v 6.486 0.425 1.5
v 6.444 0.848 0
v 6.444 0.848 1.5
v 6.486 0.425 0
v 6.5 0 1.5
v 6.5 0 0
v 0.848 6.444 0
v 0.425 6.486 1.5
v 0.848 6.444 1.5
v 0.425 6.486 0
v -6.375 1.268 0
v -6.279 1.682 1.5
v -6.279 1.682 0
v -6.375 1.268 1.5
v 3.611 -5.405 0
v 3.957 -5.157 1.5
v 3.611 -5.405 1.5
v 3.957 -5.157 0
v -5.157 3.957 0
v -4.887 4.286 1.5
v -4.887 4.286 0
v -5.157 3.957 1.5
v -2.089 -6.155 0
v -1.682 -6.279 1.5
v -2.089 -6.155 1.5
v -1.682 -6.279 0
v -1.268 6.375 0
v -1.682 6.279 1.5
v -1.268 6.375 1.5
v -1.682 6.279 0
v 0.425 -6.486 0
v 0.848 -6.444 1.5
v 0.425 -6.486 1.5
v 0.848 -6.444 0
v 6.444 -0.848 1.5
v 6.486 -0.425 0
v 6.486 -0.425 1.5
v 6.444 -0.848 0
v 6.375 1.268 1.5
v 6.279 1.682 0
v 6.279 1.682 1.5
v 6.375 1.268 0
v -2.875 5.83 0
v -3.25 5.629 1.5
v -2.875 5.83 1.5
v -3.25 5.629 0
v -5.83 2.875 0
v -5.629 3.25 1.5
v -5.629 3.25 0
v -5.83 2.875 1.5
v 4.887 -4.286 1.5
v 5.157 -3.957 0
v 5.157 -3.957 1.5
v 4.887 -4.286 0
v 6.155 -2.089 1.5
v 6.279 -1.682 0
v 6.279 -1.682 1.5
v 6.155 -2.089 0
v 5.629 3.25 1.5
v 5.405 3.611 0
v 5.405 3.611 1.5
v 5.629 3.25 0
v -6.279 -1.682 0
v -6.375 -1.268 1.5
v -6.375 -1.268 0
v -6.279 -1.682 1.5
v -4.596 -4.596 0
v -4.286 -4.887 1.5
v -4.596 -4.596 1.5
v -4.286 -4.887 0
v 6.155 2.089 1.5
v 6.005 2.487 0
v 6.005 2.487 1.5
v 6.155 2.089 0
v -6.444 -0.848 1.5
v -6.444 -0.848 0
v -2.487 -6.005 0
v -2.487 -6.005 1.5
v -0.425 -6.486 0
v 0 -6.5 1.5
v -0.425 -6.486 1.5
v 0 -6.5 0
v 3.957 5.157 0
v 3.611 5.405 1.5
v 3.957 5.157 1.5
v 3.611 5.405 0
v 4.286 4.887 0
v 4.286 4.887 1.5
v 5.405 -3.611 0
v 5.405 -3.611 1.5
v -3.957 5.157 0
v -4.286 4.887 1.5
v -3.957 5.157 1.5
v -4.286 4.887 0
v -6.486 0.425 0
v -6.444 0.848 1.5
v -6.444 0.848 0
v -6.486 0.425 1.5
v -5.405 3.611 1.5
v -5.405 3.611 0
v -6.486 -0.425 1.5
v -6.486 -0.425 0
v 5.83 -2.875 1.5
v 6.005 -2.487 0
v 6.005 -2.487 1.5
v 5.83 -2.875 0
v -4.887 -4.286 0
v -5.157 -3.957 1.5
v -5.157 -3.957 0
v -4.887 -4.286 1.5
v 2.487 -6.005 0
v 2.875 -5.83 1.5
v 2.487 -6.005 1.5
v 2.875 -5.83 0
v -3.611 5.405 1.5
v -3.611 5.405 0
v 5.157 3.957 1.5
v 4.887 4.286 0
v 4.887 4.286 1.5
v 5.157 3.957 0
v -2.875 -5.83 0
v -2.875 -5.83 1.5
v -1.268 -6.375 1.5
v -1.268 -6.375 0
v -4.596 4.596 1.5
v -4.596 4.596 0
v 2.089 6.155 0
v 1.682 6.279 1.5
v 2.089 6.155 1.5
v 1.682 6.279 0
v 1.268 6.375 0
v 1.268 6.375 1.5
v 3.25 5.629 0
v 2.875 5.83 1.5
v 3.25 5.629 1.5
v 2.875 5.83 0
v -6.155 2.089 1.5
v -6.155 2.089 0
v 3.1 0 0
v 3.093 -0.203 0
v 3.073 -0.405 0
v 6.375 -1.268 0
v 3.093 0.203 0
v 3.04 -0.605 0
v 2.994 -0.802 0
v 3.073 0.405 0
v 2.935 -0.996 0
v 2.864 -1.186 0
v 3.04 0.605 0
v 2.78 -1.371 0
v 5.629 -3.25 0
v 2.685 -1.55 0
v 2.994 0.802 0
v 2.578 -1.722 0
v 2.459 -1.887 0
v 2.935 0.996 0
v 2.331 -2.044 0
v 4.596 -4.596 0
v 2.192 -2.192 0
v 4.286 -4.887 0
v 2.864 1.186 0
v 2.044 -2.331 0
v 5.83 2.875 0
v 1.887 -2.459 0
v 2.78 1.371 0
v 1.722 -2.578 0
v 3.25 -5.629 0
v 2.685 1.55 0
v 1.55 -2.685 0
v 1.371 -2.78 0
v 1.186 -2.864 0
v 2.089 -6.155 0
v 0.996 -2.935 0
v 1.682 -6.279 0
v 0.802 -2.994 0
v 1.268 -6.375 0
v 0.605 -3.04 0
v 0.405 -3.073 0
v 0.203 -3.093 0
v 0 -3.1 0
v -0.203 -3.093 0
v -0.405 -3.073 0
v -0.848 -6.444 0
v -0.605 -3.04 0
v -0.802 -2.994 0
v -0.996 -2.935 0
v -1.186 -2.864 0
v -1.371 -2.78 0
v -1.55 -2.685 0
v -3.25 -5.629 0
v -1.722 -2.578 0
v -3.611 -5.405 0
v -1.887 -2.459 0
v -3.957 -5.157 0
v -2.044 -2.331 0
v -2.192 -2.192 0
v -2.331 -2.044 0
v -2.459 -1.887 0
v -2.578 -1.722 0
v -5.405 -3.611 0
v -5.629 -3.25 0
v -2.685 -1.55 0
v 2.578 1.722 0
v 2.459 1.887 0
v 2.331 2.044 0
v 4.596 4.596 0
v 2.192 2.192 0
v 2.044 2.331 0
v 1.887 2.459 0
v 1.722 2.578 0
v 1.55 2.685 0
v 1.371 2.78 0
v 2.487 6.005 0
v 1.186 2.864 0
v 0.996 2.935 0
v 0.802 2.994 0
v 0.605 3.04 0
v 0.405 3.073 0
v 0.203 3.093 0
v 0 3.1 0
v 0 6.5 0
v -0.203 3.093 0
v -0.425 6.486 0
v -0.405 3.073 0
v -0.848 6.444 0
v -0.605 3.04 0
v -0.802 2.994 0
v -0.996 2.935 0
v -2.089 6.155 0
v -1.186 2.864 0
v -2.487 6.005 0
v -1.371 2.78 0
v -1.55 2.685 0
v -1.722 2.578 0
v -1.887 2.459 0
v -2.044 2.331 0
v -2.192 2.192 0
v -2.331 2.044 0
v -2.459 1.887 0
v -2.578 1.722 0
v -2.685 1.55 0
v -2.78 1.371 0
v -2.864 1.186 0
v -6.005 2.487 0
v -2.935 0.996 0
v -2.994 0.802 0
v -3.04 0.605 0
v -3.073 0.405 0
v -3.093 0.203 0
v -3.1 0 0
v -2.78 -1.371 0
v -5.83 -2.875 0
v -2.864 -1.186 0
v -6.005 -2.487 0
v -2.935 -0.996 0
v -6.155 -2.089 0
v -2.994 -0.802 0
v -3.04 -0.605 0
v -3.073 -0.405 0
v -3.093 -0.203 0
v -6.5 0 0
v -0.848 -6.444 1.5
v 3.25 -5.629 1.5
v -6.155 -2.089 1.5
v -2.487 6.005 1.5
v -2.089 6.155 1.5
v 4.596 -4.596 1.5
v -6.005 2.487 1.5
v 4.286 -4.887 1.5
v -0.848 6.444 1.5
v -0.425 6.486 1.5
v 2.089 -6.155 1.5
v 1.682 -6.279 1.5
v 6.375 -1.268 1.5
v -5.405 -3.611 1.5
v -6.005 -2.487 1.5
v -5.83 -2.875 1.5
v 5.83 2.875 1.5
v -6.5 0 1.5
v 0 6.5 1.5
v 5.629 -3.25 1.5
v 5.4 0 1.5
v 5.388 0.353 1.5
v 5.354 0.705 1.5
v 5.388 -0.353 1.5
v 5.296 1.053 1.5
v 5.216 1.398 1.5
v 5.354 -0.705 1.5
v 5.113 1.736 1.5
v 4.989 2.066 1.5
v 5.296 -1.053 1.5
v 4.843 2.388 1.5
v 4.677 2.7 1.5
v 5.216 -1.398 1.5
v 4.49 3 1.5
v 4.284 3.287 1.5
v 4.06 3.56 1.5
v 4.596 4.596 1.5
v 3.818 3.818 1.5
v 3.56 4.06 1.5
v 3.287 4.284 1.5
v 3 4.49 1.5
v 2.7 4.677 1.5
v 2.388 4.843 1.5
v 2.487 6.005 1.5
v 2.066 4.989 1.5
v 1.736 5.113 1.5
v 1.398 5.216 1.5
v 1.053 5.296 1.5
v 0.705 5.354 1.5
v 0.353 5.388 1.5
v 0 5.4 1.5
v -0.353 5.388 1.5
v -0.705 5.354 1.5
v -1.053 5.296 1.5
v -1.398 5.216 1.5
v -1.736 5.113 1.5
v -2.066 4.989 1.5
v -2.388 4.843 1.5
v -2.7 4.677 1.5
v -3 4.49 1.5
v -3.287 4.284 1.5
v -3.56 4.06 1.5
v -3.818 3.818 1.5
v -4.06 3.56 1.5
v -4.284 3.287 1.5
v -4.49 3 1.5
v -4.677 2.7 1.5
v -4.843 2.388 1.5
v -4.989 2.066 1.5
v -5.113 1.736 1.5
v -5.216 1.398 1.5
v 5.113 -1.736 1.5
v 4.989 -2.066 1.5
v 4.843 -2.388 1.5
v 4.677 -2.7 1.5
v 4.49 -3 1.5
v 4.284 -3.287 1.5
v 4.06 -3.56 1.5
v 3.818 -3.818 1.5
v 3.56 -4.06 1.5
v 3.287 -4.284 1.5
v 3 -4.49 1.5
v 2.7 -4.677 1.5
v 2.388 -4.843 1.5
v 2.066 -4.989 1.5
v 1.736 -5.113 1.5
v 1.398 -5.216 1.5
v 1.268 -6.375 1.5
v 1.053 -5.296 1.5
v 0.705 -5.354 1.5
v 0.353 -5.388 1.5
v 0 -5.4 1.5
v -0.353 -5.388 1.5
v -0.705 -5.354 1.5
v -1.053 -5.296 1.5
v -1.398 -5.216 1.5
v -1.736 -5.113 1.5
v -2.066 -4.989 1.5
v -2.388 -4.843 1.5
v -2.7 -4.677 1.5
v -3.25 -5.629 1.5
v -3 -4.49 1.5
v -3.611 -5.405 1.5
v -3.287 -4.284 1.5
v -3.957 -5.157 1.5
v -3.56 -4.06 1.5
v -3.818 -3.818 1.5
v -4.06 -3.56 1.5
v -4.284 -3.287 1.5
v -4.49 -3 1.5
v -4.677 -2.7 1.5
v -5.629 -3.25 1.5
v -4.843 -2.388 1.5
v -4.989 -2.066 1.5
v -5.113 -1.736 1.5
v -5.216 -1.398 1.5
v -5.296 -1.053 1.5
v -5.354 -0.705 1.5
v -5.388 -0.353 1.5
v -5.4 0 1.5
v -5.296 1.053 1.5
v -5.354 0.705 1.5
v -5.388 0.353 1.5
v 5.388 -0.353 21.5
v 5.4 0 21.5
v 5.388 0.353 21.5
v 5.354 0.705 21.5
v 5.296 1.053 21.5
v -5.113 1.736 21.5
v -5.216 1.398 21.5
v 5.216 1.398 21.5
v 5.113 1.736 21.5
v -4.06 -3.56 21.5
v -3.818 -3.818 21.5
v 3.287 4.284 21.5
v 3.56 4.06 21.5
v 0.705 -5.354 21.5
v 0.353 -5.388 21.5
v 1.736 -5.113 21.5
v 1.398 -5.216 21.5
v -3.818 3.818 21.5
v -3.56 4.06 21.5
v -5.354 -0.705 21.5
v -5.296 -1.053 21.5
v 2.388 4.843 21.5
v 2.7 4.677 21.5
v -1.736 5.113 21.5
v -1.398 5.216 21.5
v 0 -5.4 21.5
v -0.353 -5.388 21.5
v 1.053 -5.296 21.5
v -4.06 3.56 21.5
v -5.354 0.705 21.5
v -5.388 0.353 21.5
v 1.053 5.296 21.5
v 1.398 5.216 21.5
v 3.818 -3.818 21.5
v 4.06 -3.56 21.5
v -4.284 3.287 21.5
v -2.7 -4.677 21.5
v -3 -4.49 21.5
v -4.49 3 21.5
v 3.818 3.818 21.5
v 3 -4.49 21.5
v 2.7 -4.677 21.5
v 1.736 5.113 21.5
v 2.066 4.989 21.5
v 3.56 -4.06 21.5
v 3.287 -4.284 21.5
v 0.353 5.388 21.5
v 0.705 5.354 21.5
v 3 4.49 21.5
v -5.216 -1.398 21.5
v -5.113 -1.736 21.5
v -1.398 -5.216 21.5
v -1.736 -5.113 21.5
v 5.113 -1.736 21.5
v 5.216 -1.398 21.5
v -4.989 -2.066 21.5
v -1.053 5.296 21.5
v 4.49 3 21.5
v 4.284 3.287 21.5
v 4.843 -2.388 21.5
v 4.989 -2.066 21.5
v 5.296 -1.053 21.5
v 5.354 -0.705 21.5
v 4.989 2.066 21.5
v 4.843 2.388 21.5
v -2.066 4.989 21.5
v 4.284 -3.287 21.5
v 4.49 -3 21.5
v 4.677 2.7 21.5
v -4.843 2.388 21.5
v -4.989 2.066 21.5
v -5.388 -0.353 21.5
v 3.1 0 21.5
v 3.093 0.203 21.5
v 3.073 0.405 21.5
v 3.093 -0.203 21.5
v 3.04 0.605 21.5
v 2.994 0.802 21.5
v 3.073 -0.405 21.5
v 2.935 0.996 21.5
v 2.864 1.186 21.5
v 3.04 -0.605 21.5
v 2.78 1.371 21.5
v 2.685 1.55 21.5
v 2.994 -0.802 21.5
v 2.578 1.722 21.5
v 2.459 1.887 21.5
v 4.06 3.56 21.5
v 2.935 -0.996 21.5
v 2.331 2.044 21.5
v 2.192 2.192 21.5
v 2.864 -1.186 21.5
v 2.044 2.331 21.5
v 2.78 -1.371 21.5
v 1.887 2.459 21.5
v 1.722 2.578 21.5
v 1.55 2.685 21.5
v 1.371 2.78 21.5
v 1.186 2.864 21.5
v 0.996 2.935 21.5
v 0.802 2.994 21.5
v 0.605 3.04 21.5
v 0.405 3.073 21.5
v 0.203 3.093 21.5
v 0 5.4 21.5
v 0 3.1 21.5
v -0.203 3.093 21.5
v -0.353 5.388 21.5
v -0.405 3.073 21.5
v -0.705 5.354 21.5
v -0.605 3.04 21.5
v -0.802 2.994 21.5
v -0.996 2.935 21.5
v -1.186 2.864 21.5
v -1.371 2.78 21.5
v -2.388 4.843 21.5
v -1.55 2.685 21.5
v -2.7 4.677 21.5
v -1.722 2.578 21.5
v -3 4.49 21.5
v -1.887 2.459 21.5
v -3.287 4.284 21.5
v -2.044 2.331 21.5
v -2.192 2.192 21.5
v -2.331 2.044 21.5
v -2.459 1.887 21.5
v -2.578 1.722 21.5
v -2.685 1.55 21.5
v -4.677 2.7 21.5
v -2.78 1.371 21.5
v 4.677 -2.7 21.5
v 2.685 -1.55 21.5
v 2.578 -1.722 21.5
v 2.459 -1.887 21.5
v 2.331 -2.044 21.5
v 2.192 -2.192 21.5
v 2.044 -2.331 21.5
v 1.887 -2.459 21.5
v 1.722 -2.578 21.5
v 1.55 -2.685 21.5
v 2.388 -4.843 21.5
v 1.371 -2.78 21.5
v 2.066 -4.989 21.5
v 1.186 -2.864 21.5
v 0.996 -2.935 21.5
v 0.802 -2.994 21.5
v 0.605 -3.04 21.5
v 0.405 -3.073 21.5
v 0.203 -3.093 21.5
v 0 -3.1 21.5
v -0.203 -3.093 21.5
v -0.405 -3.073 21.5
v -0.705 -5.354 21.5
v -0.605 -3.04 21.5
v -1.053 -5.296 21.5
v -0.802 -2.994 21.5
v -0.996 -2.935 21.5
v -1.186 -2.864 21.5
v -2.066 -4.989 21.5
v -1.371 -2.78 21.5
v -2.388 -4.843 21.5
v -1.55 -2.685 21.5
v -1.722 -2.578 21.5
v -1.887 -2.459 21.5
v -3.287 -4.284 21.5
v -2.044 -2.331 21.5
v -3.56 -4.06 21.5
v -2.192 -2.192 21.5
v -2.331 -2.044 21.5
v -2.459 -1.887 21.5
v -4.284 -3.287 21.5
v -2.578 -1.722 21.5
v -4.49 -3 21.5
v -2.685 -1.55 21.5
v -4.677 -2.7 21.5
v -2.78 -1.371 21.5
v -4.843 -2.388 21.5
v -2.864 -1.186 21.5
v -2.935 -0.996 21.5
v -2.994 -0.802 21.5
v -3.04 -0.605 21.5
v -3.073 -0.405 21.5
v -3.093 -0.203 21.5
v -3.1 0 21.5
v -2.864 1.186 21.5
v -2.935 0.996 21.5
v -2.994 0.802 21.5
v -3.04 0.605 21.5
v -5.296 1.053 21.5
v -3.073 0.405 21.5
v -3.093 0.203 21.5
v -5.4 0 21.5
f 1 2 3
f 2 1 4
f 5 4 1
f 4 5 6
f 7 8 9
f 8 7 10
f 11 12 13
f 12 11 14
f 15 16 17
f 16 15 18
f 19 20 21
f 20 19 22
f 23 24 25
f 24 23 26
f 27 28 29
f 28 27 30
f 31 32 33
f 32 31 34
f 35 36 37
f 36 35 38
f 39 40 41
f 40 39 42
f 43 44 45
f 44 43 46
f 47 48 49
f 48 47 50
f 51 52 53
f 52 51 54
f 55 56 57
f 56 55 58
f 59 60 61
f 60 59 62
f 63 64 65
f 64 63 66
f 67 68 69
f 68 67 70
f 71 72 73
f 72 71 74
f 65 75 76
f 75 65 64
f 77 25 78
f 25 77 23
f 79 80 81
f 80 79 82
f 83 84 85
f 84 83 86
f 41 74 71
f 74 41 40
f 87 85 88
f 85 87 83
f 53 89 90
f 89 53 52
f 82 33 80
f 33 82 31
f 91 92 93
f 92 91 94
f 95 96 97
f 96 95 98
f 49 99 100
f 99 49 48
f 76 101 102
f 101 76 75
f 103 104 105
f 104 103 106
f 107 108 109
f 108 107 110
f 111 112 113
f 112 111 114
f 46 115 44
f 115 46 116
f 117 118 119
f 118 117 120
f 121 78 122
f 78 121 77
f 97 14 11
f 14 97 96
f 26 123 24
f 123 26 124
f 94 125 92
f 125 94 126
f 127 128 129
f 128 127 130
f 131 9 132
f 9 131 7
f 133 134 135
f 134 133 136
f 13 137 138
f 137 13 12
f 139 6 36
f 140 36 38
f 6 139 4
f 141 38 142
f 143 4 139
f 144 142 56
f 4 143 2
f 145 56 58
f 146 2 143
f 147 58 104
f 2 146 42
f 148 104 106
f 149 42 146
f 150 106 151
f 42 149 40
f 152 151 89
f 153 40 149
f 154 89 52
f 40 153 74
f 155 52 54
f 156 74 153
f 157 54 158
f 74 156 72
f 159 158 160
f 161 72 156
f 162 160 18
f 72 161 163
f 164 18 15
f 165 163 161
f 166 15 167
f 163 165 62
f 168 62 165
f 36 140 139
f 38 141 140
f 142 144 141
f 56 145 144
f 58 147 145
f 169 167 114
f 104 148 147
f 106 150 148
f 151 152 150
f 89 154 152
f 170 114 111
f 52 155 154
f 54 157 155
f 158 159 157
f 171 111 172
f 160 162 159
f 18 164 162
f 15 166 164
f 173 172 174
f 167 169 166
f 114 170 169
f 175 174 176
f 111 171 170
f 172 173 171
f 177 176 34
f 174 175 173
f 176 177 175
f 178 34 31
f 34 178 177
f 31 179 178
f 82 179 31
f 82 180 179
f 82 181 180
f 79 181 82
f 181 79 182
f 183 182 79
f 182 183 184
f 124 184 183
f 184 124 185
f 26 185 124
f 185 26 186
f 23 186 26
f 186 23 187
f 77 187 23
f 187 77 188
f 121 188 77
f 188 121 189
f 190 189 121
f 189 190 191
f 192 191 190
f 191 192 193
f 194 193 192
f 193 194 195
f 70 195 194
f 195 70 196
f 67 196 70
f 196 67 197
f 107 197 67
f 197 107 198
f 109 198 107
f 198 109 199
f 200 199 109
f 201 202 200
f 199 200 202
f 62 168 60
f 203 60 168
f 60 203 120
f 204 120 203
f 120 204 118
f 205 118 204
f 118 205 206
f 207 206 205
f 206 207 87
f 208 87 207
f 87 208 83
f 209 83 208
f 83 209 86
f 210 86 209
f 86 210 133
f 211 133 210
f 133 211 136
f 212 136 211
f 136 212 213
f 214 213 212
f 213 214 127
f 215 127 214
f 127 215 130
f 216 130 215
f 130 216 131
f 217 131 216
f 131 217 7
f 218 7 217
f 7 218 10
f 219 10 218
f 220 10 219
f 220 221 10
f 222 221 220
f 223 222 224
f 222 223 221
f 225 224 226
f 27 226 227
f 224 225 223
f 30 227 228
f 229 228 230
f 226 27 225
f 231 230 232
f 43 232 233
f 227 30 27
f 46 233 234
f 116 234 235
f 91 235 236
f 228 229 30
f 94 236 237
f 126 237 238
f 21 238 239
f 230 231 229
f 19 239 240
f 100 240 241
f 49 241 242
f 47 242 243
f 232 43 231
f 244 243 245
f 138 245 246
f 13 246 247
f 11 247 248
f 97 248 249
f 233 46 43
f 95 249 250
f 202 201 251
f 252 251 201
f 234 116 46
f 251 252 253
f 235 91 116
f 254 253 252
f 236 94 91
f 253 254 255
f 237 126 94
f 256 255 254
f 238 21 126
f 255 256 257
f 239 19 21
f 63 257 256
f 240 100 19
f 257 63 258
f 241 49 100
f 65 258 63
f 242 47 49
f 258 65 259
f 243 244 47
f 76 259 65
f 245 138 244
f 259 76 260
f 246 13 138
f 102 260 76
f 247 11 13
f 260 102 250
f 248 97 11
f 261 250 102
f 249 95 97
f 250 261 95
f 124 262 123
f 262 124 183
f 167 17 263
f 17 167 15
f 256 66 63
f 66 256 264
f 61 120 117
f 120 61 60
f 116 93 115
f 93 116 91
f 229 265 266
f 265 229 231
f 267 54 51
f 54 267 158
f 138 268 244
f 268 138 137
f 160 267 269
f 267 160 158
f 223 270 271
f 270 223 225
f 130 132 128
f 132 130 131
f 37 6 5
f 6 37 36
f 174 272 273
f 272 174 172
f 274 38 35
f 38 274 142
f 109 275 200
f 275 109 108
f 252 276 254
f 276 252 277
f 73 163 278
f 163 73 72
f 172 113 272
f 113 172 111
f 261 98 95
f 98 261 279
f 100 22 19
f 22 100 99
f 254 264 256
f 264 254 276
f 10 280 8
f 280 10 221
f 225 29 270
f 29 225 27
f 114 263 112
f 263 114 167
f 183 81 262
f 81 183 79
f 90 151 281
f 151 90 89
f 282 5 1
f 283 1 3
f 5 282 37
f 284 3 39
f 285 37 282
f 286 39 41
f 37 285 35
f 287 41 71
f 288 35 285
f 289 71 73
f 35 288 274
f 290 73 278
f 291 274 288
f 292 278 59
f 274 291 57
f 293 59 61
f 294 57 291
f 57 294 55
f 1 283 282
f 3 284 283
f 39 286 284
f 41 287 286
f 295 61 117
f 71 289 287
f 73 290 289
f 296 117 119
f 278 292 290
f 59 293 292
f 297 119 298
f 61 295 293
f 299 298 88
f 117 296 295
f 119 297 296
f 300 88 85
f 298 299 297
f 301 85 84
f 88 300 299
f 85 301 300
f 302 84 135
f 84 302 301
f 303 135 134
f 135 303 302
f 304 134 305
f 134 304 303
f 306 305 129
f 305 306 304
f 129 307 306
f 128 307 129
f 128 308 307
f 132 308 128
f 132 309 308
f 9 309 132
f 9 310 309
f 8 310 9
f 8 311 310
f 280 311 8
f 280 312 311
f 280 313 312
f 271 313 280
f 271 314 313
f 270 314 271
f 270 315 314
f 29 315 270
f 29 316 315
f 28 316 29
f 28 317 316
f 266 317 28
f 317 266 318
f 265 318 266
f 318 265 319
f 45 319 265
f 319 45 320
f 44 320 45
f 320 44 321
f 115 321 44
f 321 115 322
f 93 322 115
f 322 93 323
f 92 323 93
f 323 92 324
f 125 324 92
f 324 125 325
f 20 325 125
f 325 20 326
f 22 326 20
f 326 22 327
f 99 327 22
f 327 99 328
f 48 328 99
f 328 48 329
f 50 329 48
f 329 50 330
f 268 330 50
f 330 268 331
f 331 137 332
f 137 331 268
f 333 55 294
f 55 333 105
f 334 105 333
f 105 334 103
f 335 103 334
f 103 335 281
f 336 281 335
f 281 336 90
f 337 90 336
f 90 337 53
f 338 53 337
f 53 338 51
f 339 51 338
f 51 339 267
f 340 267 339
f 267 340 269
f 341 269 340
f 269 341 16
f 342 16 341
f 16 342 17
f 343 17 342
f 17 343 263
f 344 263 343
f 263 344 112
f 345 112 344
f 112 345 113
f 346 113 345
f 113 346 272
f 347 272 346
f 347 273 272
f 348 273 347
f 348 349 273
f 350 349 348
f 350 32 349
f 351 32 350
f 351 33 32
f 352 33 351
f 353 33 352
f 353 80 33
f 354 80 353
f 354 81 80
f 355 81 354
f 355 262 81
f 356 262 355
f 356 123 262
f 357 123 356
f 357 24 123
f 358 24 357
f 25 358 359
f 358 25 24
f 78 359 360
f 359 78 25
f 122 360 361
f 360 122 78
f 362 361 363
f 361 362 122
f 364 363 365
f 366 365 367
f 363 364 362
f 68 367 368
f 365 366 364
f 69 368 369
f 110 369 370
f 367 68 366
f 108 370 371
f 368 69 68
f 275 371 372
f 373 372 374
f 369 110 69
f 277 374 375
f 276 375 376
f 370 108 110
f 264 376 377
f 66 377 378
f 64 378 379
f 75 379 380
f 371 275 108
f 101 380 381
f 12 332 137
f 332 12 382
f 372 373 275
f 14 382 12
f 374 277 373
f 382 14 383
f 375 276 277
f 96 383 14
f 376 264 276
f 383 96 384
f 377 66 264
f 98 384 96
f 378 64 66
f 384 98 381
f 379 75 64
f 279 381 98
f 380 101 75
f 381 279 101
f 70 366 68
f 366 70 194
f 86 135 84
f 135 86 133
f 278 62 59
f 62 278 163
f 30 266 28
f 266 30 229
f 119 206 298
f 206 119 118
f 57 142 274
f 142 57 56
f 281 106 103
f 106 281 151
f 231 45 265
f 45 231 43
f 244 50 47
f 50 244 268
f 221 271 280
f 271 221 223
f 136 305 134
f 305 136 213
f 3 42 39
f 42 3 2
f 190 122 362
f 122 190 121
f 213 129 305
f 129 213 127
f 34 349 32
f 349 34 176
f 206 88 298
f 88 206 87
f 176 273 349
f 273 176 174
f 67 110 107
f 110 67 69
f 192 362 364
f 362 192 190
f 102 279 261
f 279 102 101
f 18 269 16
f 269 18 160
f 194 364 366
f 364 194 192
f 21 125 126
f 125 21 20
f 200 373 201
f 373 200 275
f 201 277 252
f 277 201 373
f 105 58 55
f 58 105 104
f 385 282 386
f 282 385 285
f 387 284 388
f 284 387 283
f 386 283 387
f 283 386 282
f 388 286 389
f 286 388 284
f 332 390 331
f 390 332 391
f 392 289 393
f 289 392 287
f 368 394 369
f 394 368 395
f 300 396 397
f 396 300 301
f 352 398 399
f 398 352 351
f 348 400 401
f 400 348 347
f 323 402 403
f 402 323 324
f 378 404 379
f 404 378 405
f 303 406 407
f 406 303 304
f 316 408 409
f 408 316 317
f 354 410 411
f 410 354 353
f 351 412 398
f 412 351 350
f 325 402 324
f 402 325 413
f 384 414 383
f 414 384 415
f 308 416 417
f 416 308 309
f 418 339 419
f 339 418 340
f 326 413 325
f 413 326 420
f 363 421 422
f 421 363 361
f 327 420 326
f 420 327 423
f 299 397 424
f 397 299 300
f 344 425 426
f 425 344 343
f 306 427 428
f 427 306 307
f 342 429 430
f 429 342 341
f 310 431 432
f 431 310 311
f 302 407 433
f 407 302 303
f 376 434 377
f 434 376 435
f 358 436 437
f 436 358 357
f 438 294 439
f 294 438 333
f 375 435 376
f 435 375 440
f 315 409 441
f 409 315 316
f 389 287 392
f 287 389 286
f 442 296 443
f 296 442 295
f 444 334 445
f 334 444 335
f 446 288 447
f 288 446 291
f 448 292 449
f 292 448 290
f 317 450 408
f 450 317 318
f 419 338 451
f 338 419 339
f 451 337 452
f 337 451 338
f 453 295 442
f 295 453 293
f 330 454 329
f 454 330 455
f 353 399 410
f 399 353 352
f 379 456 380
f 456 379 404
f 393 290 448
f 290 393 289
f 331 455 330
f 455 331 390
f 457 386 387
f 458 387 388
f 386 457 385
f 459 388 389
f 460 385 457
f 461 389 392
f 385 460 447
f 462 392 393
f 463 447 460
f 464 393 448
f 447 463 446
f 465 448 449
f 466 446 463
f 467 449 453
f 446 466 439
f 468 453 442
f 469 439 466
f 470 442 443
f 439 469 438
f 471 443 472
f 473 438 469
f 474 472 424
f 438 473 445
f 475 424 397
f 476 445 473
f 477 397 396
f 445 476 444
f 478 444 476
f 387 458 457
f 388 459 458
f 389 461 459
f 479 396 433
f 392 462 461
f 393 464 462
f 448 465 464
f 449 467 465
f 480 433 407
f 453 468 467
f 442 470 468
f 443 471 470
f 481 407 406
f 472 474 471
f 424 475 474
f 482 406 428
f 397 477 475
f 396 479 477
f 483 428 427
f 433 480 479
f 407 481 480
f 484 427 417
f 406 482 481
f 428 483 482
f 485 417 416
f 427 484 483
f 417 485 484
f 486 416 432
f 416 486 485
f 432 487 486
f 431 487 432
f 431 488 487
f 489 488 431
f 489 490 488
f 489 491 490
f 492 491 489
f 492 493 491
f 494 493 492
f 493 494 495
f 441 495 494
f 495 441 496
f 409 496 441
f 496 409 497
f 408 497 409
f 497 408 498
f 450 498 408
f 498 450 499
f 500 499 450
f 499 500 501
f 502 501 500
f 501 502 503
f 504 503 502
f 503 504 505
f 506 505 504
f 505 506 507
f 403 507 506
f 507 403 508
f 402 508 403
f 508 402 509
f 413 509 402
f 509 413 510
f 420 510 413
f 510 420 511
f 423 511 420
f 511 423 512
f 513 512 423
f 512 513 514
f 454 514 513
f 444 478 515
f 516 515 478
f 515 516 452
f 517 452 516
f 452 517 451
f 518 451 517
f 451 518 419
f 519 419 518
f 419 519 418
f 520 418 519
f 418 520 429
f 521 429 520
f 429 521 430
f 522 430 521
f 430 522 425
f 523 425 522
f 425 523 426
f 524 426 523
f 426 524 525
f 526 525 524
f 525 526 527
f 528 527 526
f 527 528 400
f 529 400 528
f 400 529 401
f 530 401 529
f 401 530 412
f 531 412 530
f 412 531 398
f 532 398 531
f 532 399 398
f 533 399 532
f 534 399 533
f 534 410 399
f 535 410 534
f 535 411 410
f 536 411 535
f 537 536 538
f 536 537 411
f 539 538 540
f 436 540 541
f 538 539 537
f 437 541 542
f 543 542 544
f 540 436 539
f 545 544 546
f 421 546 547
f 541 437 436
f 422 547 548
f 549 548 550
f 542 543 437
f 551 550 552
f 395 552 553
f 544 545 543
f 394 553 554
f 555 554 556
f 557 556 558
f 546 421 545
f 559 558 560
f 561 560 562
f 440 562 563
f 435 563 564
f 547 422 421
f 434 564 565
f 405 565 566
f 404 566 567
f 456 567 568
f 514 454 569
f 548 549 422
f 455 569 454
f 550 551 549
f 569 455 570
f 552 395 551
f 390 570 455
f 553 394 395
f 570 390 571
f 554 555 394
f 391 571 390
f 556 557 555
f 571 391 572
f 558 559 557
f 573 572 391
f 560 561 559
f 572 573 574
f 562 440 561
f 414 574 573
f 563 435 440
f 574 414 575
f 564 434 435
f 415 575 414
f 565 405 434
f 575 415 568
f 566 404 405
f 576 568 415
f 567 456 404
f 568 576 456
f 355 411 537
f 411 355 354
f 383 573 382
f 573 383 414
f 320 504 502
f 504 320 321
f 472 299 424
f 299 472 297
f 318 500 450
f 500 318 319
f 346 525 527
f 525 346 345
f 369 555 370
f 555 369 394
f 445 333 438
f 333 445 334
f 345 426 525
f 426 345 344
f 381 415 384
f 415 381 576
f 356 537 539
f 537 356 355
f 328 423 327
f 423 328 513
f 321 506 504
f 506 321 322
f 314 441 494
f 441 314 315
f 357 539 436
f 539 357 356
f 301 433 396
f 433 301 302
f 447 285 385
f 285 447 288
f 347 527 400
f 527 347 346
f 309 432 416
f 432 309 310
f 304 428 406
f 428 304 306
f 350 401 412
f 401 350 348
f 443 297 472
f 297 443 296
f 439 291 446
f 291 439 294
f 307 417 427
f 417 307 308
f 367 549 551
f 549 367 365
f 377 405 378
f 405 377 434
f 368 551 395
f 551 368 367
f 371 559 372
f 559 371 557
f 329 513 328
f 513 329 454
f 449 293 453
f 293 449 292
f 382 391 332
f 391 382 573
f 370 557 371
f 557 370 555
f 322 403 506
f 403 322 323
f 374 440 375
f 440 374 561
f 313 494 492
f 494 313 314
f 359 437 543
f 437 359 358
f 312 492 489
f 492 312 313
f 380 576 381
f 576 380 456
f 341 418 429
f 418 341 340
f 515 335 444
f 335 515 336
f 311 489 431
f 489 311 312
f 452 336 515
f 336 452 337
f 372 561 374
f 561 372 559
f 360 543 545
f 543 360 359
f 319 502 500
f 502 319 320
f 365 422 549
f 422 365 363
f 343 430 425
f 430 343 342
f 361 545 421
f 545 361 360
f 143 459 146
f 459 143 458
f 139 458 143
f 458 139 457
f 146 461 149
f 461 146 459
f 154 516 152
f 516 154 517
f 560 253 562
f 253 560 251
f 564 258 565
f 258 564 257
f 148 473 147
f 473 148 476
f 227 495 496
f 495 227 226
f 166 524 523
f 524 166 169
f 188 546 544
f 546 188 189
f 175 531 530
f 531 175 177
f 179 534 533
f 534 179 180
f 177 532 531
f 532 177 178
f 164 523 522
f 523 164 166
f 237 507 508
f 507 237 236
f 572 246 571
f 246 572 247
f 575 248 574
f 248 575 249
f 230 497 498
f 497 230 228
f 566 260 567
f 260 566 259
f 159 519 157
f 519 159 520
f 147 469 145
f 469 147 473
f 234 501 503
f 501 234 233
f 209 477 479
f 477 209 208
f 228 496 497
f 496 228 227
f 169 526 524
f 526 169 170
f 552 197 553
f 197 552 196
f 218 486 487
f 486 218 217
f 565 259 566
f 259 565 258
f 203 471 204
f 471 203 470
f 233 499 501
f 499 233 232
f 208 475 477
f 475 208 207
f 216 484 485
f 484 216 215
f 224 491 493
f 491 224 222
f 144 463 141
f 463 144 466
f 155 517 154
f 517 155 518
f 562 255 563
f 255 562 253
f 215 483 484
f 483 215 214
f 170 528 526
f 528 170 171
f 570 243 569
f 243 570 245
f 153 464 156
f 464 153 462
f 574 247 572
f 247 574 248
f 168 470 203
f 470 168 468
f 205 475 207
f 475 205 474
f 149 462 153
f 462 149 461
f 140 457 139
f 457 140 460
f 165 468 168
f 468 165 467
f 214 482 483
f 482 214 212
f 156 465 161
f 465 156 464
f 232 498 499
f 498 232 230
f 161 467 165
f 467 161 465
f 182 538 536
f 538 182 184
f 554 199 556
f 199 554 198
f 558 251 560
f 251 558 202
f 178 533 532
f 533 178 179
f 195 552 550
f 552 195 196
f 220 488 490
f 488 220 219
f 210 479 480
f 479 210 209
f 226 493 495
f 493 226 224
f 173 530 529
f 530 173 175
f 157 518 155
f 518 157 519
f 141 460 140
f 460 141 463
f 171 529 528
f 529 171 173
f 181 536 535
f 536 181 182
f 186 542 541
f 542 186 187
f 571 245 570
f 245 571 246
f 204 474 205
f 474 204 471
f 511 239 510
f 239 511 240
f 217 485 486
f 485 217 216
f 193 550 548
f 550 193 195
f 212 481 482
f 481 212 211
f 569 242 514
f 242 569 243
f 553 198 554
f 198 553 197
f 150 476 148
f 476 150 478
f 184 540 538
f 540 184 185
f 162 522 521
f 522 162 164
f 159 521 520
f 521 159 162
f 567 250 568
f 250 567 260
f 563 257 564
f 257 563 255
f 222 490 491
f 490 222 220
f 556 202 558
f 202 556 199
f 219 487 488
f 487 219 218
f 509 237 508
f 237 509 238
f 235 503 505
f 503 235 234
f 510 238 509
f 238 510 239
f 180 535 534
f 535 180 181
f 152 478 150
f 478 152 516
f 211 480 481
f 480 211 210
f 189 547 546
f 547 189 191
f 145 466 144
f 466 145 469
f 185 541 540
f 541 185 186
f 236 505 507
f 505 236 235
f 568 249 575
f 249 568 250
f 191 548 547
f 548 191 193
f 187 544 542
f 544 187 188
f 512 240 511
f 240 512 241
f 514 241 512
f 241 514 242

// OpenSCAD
// PCR tube adapter sleeve - fits a 0.2 mL tube in a 1.5 mL rack hole
// Print orientation: collar on the bed (z = 0), sleeve body builds upward.

// ---------- Parameters ----------
collar_d        = 13;     // collar outer diameter
collar_t        = 1.5;    // collar thickness (z = 0 to 1.5)
sleeve_d        = 10.8;   // sleeve body outer diameter
sleeve_h        = 20;     // sleeve body height above collar (z = 1.5 to 21.5)
bore_d          = 6.2;    // through-bore diameter
eps             = 0.5;    // cutter overshoot past faces
$fn             = 96;     // curve resolution

// ---------- Model ----------
difference() {
    union() {
        // Collar: cylinder centred on origin, resting on z = 0
        cylinder(d = collar_d, h = collar_t);

        // Sleeve body: cylinder resting on top of the collar
        translate([0, 0, collar_t])
            cylinder(d = sleeve_d, h = sleeve_h);
    }

    // Through-bore: single cylinder extending past both end faces
    translate([0, 0, -eps])
        cylinder(d = bore_d, h = sleeve_h + collar_t + 2 * eps);
}
